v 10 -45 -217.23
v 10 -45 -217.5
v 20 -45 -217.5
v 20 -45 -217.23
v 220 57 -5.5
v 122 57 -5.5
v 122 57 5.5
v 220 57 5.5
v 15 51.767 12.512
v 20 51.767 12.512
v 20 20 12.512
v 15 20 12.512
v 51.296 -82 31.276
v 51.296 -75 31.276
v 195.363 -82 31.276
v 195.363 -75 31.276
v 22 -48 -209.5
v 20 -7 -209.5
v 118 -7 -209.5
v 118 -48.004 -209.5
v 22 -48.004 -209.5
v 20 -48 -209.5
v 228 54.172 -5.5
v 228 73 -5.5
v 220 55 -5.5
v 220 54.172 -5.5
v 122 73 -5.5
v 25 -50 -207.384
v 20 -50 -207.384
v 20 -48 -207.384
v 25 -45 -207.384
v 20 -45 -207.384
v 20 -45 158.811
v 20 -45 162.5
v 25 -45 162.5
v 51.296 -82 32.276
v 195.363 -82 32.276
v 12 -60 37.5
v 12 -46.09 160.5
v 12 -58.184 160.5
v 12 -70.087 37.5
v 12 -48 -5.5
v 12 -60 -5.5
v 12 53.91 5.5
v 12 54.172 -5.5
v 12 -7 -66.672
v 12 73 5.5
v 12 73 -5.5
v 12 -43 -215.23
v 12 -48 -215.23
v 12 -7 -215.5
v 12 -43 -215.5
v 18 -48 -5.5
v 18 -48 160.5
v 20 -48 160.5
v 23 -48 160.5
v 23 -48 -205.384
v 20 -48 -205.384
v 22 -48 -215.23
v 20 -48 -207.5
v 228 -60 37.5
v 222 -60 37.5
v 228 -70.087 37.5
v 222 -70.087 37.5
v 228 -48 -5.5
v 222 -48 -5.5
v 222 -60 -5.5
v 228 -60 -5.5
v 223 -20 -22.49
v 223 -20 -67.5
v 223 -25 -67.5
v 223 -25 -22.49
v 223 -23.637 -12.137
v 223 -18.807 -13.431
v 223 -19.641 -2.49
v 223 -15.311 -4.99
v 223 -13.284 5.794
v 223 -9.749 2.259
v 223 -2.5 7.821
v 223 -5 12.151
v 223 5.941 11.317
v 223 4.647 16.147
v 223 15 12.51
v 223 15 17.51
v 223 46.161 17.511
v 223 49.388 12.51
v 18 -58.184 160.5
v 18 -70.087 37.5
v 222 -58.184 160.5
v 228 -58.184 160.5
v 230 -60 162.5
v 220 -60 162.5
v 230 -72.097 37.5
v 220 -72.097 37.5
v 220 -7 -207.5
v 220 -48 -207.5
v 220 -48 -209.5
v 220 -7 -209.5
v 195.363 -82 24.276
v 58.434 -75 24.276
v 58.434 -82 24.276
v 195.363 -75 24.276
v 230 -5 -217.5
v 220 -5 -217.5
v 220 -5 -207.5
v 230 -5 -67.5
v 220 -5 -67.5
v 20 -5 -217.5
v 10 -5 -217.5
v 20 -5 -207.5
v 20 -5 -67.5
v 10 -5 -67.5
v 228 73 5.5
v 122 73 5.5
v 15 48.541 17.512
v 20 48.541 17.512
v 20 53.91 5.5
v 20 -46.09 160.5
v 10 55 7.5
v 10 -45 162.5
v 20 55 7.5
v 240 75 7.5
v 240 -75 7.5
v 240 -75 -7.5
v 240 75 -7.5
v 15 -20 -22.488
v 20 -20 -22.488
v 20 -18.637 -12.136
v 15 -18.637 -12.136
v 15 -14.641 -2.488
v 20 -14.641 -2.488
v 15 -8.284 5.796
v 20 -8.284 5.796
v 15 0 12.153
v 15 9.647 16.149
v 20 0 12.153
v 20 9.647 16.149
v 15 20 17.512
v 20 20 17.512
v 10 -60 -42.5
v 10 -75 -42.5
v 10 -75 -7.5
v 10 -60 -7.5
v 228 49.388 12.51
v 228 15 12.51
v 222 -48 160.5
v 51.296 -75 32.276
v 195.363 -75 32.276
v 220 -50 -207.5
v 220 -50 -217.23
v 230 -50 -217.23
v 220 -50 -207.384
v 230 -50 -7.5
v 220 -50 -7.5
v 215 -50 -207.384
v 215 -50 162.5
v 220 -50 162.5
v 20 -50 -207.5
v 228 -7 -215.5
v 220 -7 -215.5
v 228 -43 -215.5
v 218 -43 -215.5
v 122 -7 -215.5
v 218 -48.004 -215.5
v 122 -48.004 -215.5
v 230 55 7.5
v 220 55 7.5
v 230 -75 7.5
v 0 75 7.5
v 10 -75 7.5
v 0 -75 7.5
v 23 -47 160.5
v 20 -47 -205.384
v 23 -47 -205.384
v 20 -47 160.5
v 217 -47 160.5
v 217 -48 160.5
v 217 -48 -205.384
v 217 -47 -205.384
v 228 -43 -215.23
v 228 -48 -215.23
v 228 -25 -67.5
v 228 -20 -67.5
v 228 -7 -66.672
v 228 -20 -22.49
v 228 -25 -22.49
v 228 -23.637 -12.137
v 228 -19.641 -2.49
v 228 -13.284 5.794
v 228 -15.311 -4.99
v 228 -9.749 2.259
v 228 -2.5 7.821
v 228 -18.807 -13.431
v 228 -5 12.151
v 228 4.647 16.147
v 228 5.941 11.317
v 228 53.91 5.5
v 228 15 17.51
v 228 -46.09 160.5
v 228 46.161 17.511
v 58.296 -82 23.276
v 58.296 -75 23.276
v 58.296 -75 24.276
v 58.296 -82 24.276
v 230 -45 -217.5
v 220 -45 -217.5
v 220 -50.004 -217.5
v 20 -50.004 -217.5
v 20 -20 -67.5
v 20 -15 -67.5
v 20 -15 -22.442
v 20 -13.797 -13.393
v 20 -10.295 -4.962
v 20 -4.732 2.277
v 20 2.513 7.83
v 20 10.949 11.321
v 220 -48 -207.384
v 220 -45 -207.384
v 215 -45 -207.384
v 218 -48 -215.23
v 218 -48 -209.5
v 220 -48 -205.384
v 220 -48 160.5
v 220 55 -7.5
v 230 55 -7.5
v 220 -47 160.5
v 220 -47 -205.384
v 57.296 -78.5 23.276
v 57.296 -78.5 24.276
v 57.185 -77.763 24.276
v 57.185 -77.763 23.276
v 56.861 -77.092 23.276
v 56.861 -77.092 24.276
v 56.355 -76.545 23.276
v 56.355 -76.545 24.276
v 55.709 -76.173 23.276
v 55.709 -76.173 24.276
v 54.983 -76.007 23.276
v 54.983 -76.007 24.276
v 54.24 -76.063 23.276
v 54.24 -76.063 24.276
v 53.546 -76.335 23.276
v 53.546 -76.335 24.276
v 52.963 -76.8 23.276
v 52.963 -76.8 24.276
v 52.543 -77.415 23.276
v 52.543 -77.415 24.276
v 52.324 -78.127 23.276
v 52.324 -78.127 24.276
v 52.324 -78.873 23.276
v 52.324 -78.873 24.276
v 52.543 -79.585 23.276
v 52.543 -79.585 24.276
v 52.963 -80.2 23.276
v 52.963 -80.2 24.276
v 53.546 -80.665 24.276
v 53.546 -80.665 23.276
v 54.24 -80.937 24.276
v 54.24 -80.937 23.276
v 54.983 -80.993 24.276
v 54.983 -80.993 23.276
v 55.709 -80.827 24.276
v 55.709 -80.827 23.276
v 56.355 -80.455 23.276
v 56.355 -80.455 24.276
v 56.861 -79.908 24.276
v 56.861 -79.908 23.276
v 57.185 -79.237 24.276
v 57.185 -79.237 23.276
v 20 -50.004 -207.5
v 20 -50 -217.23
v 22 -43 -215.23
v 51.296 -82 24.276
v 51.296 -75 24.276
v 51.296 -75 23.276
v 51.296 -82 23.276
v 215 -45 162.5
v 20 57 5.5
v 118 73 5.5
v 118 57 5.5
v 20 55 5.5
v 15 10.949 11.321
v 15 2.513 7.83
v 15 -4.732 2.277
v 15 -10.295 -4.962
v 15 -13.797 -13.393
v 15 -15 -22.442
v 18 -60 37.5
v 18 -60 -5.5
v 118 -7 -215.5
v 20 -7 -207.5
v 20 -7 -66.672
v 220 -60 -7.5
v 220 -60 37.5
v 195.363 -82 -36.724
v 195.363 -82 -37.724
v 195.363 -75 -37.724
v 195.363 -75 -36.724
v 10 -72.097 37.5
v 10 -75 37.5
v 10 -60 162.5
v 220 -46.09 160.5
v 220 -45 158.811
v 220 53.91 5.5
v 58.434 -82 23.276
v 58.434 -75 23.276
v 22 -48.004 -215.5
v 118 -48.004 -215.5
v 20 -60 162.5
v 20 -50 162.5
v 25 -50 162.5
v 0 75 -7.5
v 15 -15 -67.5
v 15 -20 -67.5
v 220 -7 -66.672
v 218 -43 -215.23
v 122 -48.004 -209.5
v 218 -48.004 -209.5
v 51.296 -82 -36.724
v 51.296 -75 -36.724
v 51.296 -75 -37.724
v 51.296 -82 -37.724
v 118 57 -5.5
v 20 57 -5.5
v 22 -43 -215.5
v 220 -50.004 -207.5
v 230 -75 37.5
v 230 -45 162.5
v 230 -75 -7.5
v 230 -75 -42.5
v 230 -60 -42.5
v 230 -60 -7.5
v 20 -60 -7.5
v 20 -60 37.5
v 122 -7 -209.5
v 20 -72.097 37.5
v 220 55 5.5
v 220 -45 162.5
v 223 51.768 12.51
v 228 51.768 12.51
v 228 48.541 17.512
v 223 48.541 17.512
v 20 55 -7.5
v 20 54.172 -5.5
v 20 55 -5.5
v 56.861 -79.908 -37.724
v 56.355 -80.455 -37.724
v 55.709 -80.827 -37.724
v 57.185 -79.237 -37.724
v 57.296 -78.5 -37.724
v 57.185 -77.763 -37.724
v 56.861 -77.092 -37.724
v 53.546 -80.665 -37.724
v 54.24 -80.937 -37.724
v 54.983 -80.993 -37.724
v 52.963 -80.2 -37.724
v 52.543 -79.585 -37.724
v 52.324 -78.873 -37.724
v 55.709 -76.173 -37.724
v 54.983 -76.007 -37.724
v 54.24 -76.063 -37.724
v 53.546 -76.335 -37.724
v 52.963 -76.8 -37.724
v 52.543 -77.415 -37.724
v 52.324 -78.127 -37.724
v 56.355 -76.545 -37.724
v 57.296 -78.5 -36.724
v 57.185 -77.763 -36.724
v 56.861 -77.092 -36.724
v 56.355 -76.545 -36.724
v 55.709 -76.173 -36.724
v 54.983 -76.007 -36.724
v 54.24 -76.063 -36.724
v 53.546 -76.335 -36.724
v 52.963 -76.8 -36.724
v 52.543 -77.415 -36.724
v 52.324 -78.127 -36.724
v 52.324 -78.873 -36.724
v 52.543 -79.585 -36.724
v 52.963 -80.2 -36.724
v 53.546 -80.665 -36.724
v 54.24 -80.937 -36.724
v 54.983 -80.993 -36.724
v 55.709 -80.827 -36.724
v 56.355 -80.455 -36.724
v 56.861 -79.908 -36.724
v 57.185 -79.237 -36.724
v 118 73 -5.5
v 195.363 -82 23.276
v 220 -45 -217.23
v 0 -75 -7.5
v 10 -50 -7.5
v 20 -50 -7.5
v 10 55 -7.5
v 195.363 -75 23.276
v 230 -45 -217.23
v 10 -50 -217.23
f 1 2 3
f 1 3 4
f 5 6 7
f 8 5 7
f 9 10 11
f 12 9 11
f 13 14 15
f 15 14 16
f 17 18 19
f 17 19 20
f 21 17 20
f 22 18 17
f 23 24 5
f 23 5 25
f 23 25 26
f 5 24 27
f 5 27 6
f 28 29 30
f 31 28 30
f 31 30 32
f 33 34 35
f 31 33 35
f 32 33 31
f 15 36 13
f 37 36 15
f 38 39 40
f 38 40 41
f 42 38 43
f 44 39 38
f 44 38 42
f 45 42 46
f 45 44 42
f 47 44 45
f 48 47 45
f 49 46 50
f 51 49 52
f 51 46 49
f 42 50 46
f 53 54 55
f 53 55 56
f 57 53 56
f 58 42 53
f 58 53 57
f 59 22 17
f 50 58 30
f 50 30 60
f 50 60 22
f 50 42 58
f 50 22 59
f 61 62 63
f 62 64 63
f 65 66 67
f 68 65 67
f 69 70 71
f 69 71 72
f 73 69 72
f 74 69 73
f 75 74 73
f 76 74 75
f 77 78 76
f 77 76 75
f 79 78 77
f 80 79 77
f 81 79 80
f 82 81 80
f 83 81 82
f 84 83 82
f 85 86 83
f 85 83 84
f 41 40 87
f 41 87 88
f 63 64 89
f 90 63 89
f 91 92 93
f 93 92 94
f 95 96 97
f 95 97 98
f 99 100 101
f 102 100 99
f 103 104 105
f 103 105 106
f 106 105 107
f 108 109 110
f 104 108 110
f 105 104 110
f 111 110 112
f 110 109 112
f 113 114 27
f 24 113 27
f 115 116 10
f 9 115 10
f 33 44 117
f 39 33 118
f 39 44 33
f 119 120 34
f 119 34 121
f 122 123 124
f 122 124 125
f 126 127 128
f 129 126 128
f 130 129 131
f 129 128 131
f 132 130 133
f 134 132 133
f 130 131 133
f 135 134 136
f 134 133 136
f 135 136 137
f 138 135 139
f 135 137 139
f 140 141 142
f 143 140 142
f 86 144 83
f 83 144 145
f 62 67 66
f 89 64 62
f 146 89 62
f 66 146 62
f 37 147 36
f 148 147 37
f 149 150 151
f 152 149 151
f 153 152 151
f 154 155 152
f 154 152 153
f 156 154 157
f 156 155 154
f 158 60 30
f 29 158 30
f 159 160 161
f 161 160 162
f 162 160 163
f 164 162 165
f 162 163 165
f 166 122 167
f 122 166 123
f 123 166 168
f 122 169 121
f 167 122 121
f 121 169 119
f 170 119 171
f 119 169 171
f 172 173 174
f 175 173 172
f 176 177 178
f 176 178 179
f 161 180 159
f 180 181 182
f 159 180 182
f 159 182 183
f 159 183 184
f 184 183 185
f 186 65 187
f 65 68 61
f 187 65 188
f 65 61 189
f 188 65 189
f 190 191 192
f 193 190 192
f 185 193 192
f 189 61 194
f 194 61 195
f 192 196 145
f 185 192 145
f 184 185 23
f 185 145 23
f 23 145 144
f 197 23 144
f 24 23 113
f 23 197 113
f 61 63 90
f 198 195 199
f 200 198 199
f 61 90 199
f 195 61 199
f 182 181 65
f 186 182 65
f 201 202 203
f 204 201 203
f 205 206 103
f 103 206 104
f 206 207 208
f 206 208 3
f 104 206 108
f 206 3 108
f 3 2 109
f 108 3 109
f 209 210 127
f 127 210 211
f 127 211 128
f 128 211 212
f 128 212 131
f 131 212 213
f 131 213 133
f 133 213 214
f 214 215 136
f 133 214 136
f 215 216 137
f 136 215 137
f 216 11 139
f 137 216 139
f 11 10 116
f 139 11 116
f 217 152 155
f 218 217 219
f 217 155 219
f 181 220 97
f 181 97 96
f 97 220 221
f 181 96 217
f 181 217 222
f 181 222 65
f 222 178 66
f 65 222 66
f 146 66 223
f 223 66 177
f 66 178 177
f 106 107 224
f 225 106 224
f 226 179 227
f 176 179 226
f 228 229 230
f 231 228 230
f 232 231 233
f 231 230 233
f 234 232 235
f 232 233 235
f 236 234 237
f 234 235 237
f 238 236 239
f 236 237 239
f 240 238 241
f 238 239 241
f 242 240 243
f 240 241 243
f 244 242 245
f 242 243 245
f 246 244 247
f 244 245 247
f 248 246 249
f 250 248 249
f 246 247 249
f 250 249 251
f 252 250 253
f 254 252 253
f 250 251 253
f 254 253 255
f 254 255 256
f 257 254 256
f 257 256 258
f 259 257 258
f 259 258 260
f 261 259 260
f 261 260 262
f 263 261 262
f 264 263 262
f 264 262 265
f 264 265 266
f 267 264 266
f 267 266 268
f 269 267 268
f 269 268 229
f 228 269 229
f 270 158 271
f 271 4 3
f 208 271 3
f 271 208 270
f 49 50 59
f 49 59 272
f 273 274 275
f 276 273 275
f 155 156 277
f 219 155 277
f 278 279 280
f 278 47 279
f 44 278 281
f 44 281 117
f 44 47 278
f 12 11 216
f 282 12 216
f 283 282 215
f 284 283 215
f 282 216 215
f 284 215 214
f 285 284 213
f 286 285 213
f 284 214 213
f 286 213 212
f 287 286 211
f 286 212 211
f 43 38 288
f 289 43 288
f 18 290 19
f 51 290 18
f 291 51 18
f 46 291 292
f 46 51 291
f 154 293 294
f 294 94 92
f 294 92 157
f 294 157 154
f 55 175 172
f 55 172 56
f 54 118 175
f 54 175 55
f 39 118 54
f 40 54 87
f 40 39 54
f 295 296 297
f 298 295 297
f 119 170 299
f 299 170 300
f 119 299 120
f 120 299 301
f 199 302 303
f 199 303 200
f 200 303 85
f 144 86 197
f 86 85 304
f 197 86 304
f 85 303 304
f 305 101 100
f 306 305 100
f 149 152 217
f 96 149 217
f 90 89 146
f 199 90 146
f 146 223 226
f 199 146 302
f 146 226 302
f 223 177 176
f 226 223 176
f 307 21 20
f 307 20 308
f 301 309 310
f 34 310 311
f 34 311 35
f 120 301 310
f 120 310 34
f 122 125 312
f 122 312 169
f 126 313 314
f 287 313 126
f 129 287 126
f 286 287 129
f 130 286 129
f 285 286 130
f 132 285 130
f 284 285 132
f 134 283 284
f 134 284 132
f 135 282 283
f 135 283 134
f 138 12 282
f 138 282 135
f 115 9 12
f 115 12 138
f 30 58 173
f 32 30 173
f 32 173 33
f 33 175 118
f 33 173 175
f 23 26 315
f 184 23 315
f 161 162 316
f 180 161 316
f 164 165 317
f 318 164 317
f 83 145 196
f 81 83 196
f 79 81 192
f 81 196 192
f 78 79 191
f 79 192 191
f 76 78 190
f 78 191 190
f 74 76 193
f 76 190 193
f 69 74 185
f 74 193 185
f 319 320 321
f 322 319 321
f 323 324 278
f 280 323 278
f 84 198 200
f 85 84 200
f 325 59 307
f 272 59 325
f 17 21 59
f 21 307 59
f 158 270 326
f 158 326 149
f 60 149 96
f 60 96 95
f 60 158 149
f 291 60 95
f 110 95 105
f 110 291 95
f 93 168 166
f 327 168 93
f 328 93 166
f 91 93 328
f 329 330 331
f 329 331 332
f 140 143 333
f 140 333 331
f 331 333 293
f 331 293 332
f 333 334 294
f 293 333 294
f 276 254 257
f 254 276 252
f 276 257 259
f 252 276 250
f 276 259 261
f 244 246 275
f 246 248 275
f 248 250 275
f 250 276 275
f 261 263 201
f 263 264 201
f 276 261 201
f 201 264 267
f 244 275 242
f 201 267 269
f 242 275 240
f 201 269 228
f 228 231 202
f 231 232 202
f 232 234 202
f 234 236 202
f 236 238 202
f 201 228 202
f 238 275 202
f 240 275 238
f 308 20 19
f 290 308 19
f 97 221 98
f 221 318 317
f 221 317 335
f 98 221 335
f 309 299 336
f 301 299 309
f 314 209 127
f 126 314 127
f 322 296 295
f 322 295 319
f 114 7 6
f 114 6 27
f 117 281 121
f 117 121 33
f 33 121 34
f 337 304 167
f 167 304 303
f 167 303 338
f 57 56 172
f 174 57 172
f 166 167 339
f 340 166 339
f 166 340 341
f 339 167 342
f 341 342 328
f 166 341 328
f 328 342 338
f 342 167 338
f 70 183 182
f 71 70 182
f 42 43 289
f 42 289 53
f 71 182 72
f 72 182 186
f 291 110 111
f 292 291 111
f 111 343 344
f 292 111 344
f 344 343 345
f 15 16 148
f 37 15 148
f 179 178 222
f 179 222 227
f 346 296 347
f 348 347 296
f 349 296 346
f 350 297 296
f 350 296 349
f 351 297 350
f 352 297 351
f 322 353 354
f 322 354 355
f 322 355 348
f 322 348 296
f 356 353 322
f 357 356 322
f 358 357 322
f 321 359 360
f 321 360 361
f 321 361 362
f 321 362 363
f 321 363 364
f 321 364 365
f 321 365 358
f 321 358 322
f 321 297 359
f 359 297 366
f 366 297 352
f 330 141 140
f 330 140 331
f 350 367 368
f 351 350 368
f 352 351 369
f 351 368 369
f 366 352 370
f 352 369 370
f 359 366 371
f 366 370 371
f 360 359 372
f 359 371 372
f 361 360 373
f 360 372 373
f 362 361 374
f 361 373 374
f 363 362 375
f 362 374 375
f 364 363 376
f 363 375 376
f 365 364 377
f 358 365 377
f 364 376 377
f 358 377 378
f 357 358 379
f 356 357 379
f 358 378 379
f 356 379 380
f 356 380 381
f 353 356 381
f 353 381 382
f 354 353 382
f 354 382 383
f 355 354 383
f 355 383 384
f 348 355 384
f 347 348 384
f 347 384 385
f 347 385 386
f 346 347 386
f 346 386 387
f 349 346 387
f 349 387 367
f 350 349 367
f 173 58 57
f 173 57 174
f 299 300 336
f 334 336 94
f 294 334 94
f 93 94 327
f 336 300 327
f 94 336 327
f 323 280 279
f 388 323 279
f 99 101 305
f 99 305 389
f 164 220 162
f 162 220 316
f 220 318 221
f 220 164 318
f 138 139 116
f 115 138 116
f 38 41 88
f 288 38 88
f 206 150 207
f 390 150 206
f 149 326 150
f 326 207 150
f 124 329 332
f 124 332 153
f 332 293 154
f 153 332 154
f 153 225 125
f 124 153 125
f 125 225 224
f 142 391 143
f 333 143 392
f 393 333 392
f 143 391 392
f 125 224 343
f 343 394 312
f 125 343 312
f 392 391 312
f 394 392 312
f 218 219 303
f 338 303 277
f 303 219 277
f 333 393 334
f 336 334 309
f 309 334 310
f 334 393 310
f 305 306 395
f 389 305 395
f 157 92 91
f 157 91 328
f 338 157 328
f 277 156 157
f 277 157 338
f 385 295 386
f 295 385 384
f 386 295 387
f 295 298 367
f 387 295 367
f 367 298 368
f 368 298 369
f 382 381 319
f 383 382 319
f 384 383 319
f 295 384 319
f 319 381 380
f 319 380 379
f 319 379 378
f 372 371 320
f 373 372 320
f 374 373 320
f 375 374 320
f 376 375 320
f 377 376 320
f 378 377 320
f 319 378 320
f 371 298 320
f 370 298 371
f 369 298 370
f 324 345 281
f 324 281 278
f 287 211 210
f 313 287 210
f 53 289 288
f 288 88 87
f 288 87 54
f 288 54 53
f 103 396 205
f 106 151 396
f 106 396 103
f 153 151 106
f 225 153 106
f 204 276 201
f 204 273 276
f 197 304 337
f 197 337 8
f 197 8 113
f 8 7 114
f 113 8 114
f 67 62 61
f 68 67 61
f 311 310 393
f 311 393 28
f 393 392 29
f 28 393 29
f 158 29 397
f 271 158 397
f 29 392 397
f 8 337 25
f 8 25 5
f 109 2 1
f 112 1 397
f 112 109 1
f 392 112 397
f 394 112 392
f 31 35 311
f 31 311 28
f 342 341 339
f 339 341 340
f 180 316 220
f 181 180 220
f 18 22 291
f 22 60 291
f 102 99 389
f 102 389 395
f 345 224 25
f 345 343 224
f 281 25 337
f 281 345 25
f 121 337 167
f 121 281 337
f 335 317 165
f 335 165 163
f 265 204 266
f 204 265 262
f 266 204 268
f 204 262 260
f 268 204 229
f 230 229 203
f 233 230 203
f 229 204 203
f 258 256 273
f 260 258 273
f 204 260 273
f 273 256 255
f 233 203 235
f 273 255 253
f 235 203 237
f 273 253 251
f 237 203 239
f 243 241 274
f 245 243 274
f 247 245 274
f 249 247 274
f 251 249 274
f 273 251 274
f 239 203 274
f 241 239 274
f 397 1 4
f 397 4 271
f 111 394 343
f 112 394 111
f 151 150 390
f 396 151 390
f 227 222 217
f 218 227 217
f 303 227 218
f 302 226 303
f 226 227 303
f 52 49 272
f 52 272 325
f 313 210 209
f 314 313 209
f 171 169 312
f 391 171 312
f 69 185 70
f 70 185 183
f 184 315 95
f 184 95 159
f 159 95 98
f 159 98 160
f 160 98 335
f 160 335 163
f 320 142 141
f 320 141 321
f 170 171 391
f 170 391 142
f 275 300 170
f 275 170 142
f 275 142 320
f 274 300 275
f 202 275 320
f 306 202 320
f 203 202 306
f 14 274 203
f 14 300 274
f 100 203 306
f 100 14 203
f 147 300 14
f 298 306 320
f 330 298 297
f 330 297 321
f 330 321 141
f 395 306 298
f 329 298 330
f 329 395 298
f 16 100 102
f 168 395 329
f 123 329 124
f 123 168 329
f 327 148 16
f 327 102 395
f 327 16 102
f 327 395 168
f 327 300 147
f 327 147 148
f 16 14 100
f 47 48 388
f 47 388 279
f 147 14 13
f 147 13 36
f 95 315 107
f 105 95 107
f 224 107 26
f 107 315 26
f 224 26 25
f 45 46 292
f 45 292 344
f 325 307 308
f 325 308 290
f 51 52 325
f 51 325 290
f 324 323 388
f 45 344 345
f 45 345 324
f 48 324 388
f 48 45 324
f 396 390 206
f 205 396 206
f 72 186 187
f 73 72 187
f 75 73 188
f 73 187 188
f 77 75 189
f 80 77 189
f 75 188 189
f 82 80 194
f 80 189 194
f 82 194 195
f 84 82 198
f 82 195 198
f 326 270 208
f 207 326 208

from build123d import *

# Parameters (mm, degrees)
CROQUIS2_W               = 15
CROQUIS2_H               = 150
SALIENTE_EXTRUIR1_DEPTH  = 10
SALIENTE_EXTRUIR2_DEPTH  = 10
CROQUIS5_W               = 15
CROQUIS5_H               = 15
CROQUIS5_H_2             = 20
CROQUIS5_W_2             = 10
CROQUIS5_H_3             = 45.004018959
SALIENTE_EXTRUIR3_DEPTH  = 100
CROQUIS6_W               = 369.884378223
CROQUIS6_H               = 5
SALIENTE_EXTRUIR6_DEPTH  = 5
VACIADO1_START           = 12
VACIADO1_OUTLINE_W       = 11
VACIADO1_OUTLINE_H       = 11
VACIADO1_DEPTH           = 8
VACIADO1_START_2         = 20
VACIADO1_2_OUTLINE_W     = 16
VACIADO1_2_OUTLINE_H     = 11
VACIADO1_2_OUTLINE_W_2   = 11
VACIADO1_2_DEPTH         = 98
VACIADO1_3_DEPTH         = 6
VACIADO1_START_3         = 2
VACIADO1_4_OUTLINE_W     = 146
VACIADO1_4_OUTLINE_H     = 11
VACIADO1_4_DEPTH         = 10
VACIADO1_5_OUTLINE_W     = 1
VACIADO1_5_OUTLINE_H     = 365.884378223
VACIADO1_5_DEPTH         = 3
VACIADO1_START_4         = 22
VACIADO1_6_DEPTH         = 96
SALIENTE_EXTRUIR7_DEPTH  = 5
CROQUIS8_W               = 15
CROQUIS8_H               = 150
SALIENTE_EXTRUIR8_DEPTH  = 10
SIMETR_A8_START          = 228
SIMETR_A8_DEPTH          = 2
SIMETR_A8_START_2        = 120
SIMETR_A8_2_OUTLINE_W    = 20
SIMETR_A8_2_OUTLINE_H    = 15
SIMETR_A8_2_OUTLINE_W_2  = 16
SIMETR_A8_2_OUTLINE_H_2  = 11
SIMETR_A8_2_OUTLINE_W_3  = 15
SIMETR_A8_2_OUTLINE_W_4  = 11
SIMETR_A8_2_OUTLINE_W_5  = 45.004018959
SIMETR_A8_2_OUTLINE_H_3  = 10
SIMETR_A8_2_OUTLINE_W_6  = 41.004018959
SIMETR_A8_2_OUTLINE_H_4  = 6
SIMETR_A8_2_DEPTH        = 100
SIMETR_A8_START_3        = 230
SIMETR_A8_3_OUTLINE_W    = 150
SIMETR_A8_3_OUTLINE_H    = 15
SIMETR_A8_3_DEPTH        = 10
SIMETR_A8_START_4        = 220
SIMETR_A8_4_DEPTH        = 8
SIMETR_A8_START_5        = 215
SIMETR_A8_5_OUTLINE_W    = 5
SIMETR_A8_5_OUTLINE_H    = 369.884378223
SIMETR_A8_5_OUTLINE_W_2  = 1
SIMETR_A8_5_OUTLINE_H_2  = 365.884378223
SIMETR_A8_5_DEPTH        = 5
SIMETR_A8_6_DEPTH        = 2
SIMETR_A8_7_OUTLINE_W    = 16
SIMETR_A8_7_OUTLINE_H    = 11
SIMETR_A8_7_OUTLINE_W_2  = 11
SIMETR_A8_7_OUTLINE_W_3  = 41.004018959
SIMETR_A8_7_OUTLINE_H_2  = 6
SIMETR_A8_7_DEPTH        = 2
SIMETR_A8_8_OUTLINE_W    = 1
SIMETR_A8_8_OUTLINE_H    = 365.884378223
SIMETR_A8_8_DEPTH        = 2
SIMETR_A8_START_6        = 218
SIMETR_A8_9_DEPTH        = 2
SALIENTE_EXTRUIR9_DEPTH  = 5
CROQUIS10_W              = 220
CROQUIS10_H              = 80
SALIENTE_EXTRUIR10_DEPTH = 15
CROQUIS11_W              = 7
CROQUIS11_H              = 1
SALIENTE_EXTRUIR11_DEPTH = 7
CROQUIS12_R              = 2.5
CORTAR_EXTRUIR1_DEPTH    = 351.399583266
CROQUIS13_W              = 137.06677635
CROQUIS13_H              = 7
SALIENTE_EXTRUIR13_DEPTH = 1
CROQUIS14_W              = 136.928381549
CROQUIS14_H              = 7
SALIENTE_EXTRUIR14_DEPTH = 1
CROQUIS15_W              = 144.06677635
CROQUIS15_H              = 1
SALIENTE_EXTRUIR15_DEPTH = 7


# Read off the part's stored shape, not the designer's step: Vaciado1, Simetría8
with BuildPart() as part:
    # Croquis2 → Saliente-Extruir1 (new body)
    with BuildSketch(Plane(origin=(0, 0, 0), x_dir=(0, 0, -1), z_dir=(1, 0, 0))):
        Rectangle(CROQUIS2_W, CROQUIS2_H)
    extrude(amount=SALIENTE_EXTRUIR1_DEPTH)

    # Croquis3 → Saliente-Extruir2 (add)
    with BuildSketch(Plane(origin=(10, 0, 0), x_dir=(0, 0, -1), z_dir=(1, 0, 0))):
        Polygon((-7.5, -75), (-162.5, -60), (-162.5, -45), (-7.5, 55), (-7.5, 75), (7.5, 75), (7.5, 55), (67.5, -5), (217.5, -5), (217.5, -45), (217.230368445, -45), (217.230368445, -50), (7.5, -50), (7.5, -75), align=None)
    extrude(amount=SALIENTE_EXTRUIR2_DEPTH)

    # Croquis5 → Saliente-Extruir3 (add)
    with BuildSketch(Plane(origin=(20, 0, 0), x_dir=(0, 0, -1), z_dir=(1, 0, 0))):
        with Locations((0, -67.5)):
            Rectangle(CROQUIS5_W, CROQUIS5_H)
        with Locations((0, 65)):
            Rectangle(CROQUIS5_W, CROQUIS5_H_2)
        with Locations((212.5, -27.502009479)):
            Rectangle(CROQUIS5_W_2, CROQUIS5_H_3)
    extrude(amount=SALIENTE_EXTRUIR3_DEPTH)

    # Croquis6 → Saliente-Extruir6 (add)
    with BuildSketch(Plane(origin=(20, 0, 0), x_dir=(0, 0, -1), z_dir=(1, 0, 0))):
        with Locations((22.442189111, -47.5)):
            Rectangle(CROQUIS6_W, CROQUIS6_H)
    extrude(amount=SALIENTE_EXTRUIR6_DEPTH)

    # Vaciado1 outline → Vaciado1 (cut)
    with BuildSketch(Plane.YZ.offset(VACIADO1_START)):
        Polygon((73, -5.5), (73, 5.5), (53.910210742, 5.5), (-46.089789258, 160.5), (-48, 160.5), (-48, -215.230368445), (-43, -215.230368445), (-43, -215.5), (-7, -215.5), (-7, -66.671572875), (54.171572875, -5.5), align=None)
        with Locations((-67.5, 0)):
            Rectangle(VACIADO1_OUTLINE_W, VACIADO1_OUTLINE_H)
    extrude(amount=VACIADO1_DEPTH, mode=Mode.SUBTRACT)

    # Vaciado1 2 outline → Vaciado1 2 (cut)
    with BuildSketch(Plane.YZ.offset(VACIADO1_START_2)):
        with Locations((65, 0)):
            Rectangle(VACIADO1_2_OUTLINE_W, VACIADO1_2_OUTLINE_H)
        Polygon((-7, -215.5), (-7, -209.5), (-48, -209.5), (-48, -215.230368445), (-43, -215.230368445), (-43, -215.5), align=None)
        with Locations((-67.5, 0)):
            Rectangle(VACIADO1_2_OUTLINE_W_2, VACIADO1_2_OUTLINE_H)
    extrude(amount=VACIADO1_2_DEPTH, mode=Mode.SUBTRACT)

    # Vaciado1 3 outline → Vaciado1 3 (cut)
    with BuildSketch(Plane.YZ.offset(VACIADO1_START)):
        Polygon((-62, -5.5), (-48, -5.5), (-48, 160.5), (-58.184204967, 160.5), (-73, 7.40345133), (-73, 5.5), (-62, 5.5), align=None)
    extrude(amount=VACIADO1_3_DEPTH, mode=Mode.SUBTRACT)

    # Vaciado1 4 outline → Vaciado1 4 (cut)
    with BuildSketch(Plane.YZ.offset(VACIADO1_START_3)):
        Rectangle(VACIADO1_4_OUTLINE_W, VACIADO1_4_OUTLINE_H)
    extrude(amount=VACIADO1_4_DEPTH, mode=Mode.SUBTRACT)

    # Vaciado1 5 outline → Vaciado1 5 (cut)
    with BuildSketch(Plane.YZ.offset(VACIADO1_START_2)):
        with Locations((-47.5, -22.442189111)):
            Rectangle(VACIADO1_5_OUTLINE_W, VACIADO1_5_OUTLINE_H)
    extrude(amount=VACIADO1_5_DEPTH, mode=Mode.SUBTRACT)

    # Vaciado1 6 outline → Vaciado1 6 (cut)
    with BuildSketch(Plane.YZ.offset(VACIADO1_START_4)):
        Polygon((-48, -215.230368445), (-48, -209.5), (-48.004018959, -209.5), (-48.004018959, -215.5), (-43, -215.5), (-43, -215.230368445), align=None)
    extrude(amount=VACIADO1_6_DEPTH, mode=Mode.SUBTRACT)

    # Croquis8 → Saliente-Extruir8 (add)
    with BuildSketch(Plane(origin=(12, 0, 0), x_dir=(0, 0, -1), z_dir=(1, 0, 0))):
        Rectangle(CROQUIS8_W, CROQUIS8_H)
    extrude(amount=-SALIENTE_EXTRUIR8_DEPTH)

    # Simetr_a8 2 outline → Simetr_a8 2 (add)
    # profile 1 of 3: a face of its own
    with BuildSketch(Plane.YZ.offset(SIMETR_A8_START_2)):
        with Locations((65, 0)):
            Rectangle(SIMETR_A8_2_OUTLINE_W, SIMETR_A8_2_OUTLINE_H)
        with Locations((65, 0)):
            Rectangle(SIMETR_A8_2_OUTLINE_W_2, SIMETR_A8_2_OUTLINE_H_2, mode=Mode.SUBTRACT)
    # profile 2 of 3: a face of its own
    with BuildSketch(Plane.YZ.offset(SIMETR_A8_START_2)):
        with Locations((-67.5, 0)):
            Rectangle(SIMETR_A8_2_OUTLINE_W_3, SIMETR_A8_2_OUTLINE_H)
        with Locations((-67.5, 0)):
            Rectangle(SIMETR_A8_2_OUTLINE_W_4, SIMETR_A8_2_OUTLINE_H_2, mode=Mode.SUBTRACT)
    # profile 3 of 3: a face of its own
    with BuildSketch(Plane.YZ.offset(SIMETR_A8_START_2)):
        with Locations((-27.502009479, -212.5)):
            Rectangle(SIMETR_A8_2_OUTLINE_W_5, SIMETR_A8_2_OUTLINE_H_3)
        with Locations((-27.502009479, -212.5)):
            Rectangle(SIMETR_A8_2_OUTLINE_W_6, SIMETR_A8_2_OUTLINE_H_4, mode=Mode.SUBTRACT)
    extrude(amount=SIMETR_A8_2_DEPTH)



with BuildPart() as body_2:
    # Croquis7 → Saliente-Extruir7 (new body)
    with BuildSketch(Plane(origin=(20, 0, 0), x_dir=(0, 0, -1), z_dir=(1, 0, 0))):
        with BuildLine():
            Line((-17.511578112, 20), (-17.511578112, 48.540917347))
            Line((-17.511578112, 48.540917347), (-12.511578112, 51.766723799))
            Line((-12.511578112, 51.766723799), (-12.511578112, 20))
            ThreePointArc((-12.511578112, 20), (-2.276657661, -4.732396988), (22.442189111, -15))
            Line((22.442189111, -15), (67.5, -15))
            Line((67.5, -15), (67.5, -20))
            Line((67.5, -20), (22.488421888, -20))
            ThreePointArc((22.488421888, -20), (-5.795849359, -8.284271247), (-17.511578112, 20))
        make_face()
    extrude(amount=-SALIENTE_EXTRUIR7_DEPTH)


with BuildPart() as body_3:
    # Simetría8 outline → Simetría8 (new body)
    with BuildSketch(Plane.YZ.offset(SIMETR_A8_START)):
        Polygon((-45, 162.5), (-60, 162.5), (-75, 7.5), (-75, -7.5), (-50, -7.5), (-50, -217.230368445), (-45, -217.230368445), (-45, -217.5), (-5, -217.5), (-5, -67.5), (55, -7.5), (75, -7.5), (75, 7.5), (55, 7.5), align=None)
    extrude(amount=SIMETR_A8_DEPTH)

    # Simetr_a8 3 outline → Simetr_a8 3 (add)
    with BuildSketch(Plane.YZ.offset(SIMETR_A8_START_3)):
        Rectangle(SIMETR_A8_3_OUTLINE_W, SIMETR_A8_3_OUTLINE_H)
    extrude(amount=SIMETR_A8_3_DEPTH)


with BuildPart() as part_1:
    add(part.part)

    add(body_3.part)  # Simetr_a8 4 merges body 3
    # Simetr_a8 4 outline → Simetr_a8 4 (add)
    with BuildSketch(Plane.YZ.offset(SIMETR_A8_START_4)):
        Polygon((-45, 162.5), (-60, 162.5), (-75, 7.5), (-75, -7.5), (-50, -7.5), (-50, -217.230368445), (-45, -217.230368445), (-45, -217.5), (-5, -217.5), (-5, -67.5), (55, -7.5), (75, -7.5), (75, 7.5), (55, 7.5), align=None)
        Polygon((-46.089789258, 160.5), (53.910210742, 5.5), (73, 5.5), (73, -5.5), (54.171572875, -5.5), (-7, -66.671572875), (-7, -215.5), (-43, -215.5), (-43, -215.230368445), (-48, -215.230368445), (-48, -5.5), (-73, -5.5), (-73, 7.40345133), (-58.184204967, 160.5), align=None, mode=Mode.SUBTRACT)
    extrude(amount=SIMETR_A8_4_DEPTH)

    # Simetr_a8 5 outline → Simetr_a8 5 (add)
    with BuildSketch(Plane.YZ.offset(SIMETR_A8_START_5)):
        with Locations((-47.5, -22.442189111)):
            Rectangle(SIMETR_A8_5_OUTLINE_W, SIMETR_A8_5_OUTLINE_H)
        with Locations((-47.5, -22.442189111)):
            Rectangle(SIMETR_A8_5_OUTLINE_W_2, SIMETR_A8_5_OUTLINE_H_2, mode=Mode.SUBTRACT)
    extrude(amount=SIMETR_A8_5_DEPTH)

    # Simetr_a8 6 outline → Simetr_a8 6 (add)
    with BuildSketch(Plane.YZ.offset(SIMETR_A8_START_4)):
        Polygon((-48, 160.5), (-58.184204967, 160.5), (-73, 7.40345133), (-73, 5.5), (-62, 5.5), (-62, -5.5), (-48, -5.5), align=None)
    extrude(amount=SIMETR_A8_6_DEPTH)

    # Simetr_a8 7 outline → Simetr_a8 7 (add)
    with BuildSketch(Plane.YZ.offset(SIMETR_A8_START_2)):
        with Locations((65, 0)):
            Rectangle(SIMETR_A8_7_OUTLINE_W, SIMETR_A8_7_OUTLINE_H)
        with Locations((-67.5, 0)):
            Rectangle(SIMETR_A8_7_OUTLINE_W_2, SIMETR_A8_7_OUTLINE_H)
        with Locations((-27.502009479, -212.5)):
            Rectangle(SIMETR_A8_7_OUTLINE_W_3, SIMETR_A8_7_OUTLINE_H_2)
    extrude(amount=SIMETR_A8_7_DEPTH)

    # Simetr_a8 8 outline → Simetr_a8 8 (add)
    with BuildSketch(Plane.YZ.offset(SIMETR_A8_START_5)):
        with Locations((-47.5, -22.442189111)):
            Rectangle(SIMETR_A8_8_OUTLINE_W, SIMETR_A8_8_OUTLINE_H)
    extrude(amount=SIMETR_A8_8_DEPTH)

    # Simetr_a8 9 outline → Simetr_a8 9 (add)
    with BuildSketch(Plane.YZ.offset(SIMETR_A8_START_6)):
        Polygon((-48, -215.230368445), (-48, -209.5), (-48.004018959, -209.5), (-48.004018959, -215.5), (-43, -215.5), (-43, -215.230368445), align=None)
    extrude(amount=SIMETR_A8_9_DEPTH)

    # Croquis9 → Saliente-Extruir9 (add)
    with BuildSketch(Plane.ZY.offset(-228)):
        with BuildLine():
            Line((-67.5, -25), (-22.49, -25))
            ThreePointArc((-22.49, -25), (5.794271247, -13.284271247), (17.51, 15))
            Line((17.51, 15), (17.511578112, 48.540917347))
            Line((17.511578112, 48.540917347), (12.51, 51.767741935))
            Line((12.51, 51.767741935), (12.51, 15))
            ThreePointArc((12.51, 15), (2.258737342, -9.748737342), (-22.49, -20))
            Line((-22.49, -20), (-67.5, -20))
            Line((-67.5, -20), (-67.5, -25))
        make_face()
    extrude(amount=SALIENTE_EXTRUIR9_DEPTH)

    # Croquis10 → Saliente-Extruir10 (add)
    with BuildSketch(Plane.XZ.offset(75)):
        with Locations((120, -2.5)):
            Rectangle(CROQUIS10_W, CROQUIS10_H)
    extrude(amount=-SALIENTE_EXTRUIR10_DEPTH)

    # Croquis11 → Saliente-Extruir11 (add)
    with BuildSketch(Plane.XZ.offset(75)):
        Polygon((58.295818619, -36.723516543), (54.795818619, -36.723516543), (51.295818619, -36.723516543), (51.295818619, -37.723516543), (58.295818619, -37.723516543), align=None)
        Polygon((51.295818619, 23.276483457), (54.795818619, 23.276483457), (58.295818619, 23.276483457), (58.295818619, 24.276483457), (51.295818619, 24.276483457), align=None)
        with Locations((184.795818619, 23.776483457)):
            Rectangle(CROQUIS11_W, CROQUIS11_H)
        with Locations((184.795818619, -37.223516543)):
            Rectangle(CROQUIS11_W, CROQUIS11_H)
    extrude(amount=SALIENTE_EXTRUIR11_DEPTH)

    # Croquis12 → Cortar-Extruir1 (cut, through all)
    with BuildSketch(Plane.XY.offset(24.276483457)):
        with Locations((54.795818619, -78.5)):
            Circle(CROQUIS12_R)
        with Locations((184.795818619, -78.5)):
            Circle(CROQUIS12_R)
    extrude(amount=-CORTAR_EXTRUIR1_DEPTH, mode=Mode.SUBTRACT)

    # Croquis13 → Saliente-Extruir13 (add)
    with BuildSketch(Plane(origin=(0, 0, -37.723516543), x_dir=(-1, 0, 0), z_dir=(0, 0, -1))):
        with Locations((-126.829206794, -78.5)):
            Rectangle(CROQUIS13_W, CROQUIS13_H)
    extrude(amount=-SALIENTE_EXTRUIR13_DEPTH)

    # Croquis14 → Saliente-Extruir14 (add)
    with BuildSketch(Plane.XY.offset(24.276483457)):
        with Locations((126.898404195, -78.5)):
            Rectangle(CROQUIS14_W, CROQUIS14_H)
    extrude(amount=-SALIENTE_EXTRUIR14_DEPTH)

    # Croquis15 → Saliente-Extruir15 (add)
    with BuildSketch(Plane.XZ.offset(75)):
        with Locations((123.329206794, 31.776483457)):
            Rectangle(CROQUIS15_W, CROQUIS15_H)
    extrude(amount=SALIENTE_EXTRUIR15_DEPTH)


solid = Compound([body_2.part, part_1.part])
